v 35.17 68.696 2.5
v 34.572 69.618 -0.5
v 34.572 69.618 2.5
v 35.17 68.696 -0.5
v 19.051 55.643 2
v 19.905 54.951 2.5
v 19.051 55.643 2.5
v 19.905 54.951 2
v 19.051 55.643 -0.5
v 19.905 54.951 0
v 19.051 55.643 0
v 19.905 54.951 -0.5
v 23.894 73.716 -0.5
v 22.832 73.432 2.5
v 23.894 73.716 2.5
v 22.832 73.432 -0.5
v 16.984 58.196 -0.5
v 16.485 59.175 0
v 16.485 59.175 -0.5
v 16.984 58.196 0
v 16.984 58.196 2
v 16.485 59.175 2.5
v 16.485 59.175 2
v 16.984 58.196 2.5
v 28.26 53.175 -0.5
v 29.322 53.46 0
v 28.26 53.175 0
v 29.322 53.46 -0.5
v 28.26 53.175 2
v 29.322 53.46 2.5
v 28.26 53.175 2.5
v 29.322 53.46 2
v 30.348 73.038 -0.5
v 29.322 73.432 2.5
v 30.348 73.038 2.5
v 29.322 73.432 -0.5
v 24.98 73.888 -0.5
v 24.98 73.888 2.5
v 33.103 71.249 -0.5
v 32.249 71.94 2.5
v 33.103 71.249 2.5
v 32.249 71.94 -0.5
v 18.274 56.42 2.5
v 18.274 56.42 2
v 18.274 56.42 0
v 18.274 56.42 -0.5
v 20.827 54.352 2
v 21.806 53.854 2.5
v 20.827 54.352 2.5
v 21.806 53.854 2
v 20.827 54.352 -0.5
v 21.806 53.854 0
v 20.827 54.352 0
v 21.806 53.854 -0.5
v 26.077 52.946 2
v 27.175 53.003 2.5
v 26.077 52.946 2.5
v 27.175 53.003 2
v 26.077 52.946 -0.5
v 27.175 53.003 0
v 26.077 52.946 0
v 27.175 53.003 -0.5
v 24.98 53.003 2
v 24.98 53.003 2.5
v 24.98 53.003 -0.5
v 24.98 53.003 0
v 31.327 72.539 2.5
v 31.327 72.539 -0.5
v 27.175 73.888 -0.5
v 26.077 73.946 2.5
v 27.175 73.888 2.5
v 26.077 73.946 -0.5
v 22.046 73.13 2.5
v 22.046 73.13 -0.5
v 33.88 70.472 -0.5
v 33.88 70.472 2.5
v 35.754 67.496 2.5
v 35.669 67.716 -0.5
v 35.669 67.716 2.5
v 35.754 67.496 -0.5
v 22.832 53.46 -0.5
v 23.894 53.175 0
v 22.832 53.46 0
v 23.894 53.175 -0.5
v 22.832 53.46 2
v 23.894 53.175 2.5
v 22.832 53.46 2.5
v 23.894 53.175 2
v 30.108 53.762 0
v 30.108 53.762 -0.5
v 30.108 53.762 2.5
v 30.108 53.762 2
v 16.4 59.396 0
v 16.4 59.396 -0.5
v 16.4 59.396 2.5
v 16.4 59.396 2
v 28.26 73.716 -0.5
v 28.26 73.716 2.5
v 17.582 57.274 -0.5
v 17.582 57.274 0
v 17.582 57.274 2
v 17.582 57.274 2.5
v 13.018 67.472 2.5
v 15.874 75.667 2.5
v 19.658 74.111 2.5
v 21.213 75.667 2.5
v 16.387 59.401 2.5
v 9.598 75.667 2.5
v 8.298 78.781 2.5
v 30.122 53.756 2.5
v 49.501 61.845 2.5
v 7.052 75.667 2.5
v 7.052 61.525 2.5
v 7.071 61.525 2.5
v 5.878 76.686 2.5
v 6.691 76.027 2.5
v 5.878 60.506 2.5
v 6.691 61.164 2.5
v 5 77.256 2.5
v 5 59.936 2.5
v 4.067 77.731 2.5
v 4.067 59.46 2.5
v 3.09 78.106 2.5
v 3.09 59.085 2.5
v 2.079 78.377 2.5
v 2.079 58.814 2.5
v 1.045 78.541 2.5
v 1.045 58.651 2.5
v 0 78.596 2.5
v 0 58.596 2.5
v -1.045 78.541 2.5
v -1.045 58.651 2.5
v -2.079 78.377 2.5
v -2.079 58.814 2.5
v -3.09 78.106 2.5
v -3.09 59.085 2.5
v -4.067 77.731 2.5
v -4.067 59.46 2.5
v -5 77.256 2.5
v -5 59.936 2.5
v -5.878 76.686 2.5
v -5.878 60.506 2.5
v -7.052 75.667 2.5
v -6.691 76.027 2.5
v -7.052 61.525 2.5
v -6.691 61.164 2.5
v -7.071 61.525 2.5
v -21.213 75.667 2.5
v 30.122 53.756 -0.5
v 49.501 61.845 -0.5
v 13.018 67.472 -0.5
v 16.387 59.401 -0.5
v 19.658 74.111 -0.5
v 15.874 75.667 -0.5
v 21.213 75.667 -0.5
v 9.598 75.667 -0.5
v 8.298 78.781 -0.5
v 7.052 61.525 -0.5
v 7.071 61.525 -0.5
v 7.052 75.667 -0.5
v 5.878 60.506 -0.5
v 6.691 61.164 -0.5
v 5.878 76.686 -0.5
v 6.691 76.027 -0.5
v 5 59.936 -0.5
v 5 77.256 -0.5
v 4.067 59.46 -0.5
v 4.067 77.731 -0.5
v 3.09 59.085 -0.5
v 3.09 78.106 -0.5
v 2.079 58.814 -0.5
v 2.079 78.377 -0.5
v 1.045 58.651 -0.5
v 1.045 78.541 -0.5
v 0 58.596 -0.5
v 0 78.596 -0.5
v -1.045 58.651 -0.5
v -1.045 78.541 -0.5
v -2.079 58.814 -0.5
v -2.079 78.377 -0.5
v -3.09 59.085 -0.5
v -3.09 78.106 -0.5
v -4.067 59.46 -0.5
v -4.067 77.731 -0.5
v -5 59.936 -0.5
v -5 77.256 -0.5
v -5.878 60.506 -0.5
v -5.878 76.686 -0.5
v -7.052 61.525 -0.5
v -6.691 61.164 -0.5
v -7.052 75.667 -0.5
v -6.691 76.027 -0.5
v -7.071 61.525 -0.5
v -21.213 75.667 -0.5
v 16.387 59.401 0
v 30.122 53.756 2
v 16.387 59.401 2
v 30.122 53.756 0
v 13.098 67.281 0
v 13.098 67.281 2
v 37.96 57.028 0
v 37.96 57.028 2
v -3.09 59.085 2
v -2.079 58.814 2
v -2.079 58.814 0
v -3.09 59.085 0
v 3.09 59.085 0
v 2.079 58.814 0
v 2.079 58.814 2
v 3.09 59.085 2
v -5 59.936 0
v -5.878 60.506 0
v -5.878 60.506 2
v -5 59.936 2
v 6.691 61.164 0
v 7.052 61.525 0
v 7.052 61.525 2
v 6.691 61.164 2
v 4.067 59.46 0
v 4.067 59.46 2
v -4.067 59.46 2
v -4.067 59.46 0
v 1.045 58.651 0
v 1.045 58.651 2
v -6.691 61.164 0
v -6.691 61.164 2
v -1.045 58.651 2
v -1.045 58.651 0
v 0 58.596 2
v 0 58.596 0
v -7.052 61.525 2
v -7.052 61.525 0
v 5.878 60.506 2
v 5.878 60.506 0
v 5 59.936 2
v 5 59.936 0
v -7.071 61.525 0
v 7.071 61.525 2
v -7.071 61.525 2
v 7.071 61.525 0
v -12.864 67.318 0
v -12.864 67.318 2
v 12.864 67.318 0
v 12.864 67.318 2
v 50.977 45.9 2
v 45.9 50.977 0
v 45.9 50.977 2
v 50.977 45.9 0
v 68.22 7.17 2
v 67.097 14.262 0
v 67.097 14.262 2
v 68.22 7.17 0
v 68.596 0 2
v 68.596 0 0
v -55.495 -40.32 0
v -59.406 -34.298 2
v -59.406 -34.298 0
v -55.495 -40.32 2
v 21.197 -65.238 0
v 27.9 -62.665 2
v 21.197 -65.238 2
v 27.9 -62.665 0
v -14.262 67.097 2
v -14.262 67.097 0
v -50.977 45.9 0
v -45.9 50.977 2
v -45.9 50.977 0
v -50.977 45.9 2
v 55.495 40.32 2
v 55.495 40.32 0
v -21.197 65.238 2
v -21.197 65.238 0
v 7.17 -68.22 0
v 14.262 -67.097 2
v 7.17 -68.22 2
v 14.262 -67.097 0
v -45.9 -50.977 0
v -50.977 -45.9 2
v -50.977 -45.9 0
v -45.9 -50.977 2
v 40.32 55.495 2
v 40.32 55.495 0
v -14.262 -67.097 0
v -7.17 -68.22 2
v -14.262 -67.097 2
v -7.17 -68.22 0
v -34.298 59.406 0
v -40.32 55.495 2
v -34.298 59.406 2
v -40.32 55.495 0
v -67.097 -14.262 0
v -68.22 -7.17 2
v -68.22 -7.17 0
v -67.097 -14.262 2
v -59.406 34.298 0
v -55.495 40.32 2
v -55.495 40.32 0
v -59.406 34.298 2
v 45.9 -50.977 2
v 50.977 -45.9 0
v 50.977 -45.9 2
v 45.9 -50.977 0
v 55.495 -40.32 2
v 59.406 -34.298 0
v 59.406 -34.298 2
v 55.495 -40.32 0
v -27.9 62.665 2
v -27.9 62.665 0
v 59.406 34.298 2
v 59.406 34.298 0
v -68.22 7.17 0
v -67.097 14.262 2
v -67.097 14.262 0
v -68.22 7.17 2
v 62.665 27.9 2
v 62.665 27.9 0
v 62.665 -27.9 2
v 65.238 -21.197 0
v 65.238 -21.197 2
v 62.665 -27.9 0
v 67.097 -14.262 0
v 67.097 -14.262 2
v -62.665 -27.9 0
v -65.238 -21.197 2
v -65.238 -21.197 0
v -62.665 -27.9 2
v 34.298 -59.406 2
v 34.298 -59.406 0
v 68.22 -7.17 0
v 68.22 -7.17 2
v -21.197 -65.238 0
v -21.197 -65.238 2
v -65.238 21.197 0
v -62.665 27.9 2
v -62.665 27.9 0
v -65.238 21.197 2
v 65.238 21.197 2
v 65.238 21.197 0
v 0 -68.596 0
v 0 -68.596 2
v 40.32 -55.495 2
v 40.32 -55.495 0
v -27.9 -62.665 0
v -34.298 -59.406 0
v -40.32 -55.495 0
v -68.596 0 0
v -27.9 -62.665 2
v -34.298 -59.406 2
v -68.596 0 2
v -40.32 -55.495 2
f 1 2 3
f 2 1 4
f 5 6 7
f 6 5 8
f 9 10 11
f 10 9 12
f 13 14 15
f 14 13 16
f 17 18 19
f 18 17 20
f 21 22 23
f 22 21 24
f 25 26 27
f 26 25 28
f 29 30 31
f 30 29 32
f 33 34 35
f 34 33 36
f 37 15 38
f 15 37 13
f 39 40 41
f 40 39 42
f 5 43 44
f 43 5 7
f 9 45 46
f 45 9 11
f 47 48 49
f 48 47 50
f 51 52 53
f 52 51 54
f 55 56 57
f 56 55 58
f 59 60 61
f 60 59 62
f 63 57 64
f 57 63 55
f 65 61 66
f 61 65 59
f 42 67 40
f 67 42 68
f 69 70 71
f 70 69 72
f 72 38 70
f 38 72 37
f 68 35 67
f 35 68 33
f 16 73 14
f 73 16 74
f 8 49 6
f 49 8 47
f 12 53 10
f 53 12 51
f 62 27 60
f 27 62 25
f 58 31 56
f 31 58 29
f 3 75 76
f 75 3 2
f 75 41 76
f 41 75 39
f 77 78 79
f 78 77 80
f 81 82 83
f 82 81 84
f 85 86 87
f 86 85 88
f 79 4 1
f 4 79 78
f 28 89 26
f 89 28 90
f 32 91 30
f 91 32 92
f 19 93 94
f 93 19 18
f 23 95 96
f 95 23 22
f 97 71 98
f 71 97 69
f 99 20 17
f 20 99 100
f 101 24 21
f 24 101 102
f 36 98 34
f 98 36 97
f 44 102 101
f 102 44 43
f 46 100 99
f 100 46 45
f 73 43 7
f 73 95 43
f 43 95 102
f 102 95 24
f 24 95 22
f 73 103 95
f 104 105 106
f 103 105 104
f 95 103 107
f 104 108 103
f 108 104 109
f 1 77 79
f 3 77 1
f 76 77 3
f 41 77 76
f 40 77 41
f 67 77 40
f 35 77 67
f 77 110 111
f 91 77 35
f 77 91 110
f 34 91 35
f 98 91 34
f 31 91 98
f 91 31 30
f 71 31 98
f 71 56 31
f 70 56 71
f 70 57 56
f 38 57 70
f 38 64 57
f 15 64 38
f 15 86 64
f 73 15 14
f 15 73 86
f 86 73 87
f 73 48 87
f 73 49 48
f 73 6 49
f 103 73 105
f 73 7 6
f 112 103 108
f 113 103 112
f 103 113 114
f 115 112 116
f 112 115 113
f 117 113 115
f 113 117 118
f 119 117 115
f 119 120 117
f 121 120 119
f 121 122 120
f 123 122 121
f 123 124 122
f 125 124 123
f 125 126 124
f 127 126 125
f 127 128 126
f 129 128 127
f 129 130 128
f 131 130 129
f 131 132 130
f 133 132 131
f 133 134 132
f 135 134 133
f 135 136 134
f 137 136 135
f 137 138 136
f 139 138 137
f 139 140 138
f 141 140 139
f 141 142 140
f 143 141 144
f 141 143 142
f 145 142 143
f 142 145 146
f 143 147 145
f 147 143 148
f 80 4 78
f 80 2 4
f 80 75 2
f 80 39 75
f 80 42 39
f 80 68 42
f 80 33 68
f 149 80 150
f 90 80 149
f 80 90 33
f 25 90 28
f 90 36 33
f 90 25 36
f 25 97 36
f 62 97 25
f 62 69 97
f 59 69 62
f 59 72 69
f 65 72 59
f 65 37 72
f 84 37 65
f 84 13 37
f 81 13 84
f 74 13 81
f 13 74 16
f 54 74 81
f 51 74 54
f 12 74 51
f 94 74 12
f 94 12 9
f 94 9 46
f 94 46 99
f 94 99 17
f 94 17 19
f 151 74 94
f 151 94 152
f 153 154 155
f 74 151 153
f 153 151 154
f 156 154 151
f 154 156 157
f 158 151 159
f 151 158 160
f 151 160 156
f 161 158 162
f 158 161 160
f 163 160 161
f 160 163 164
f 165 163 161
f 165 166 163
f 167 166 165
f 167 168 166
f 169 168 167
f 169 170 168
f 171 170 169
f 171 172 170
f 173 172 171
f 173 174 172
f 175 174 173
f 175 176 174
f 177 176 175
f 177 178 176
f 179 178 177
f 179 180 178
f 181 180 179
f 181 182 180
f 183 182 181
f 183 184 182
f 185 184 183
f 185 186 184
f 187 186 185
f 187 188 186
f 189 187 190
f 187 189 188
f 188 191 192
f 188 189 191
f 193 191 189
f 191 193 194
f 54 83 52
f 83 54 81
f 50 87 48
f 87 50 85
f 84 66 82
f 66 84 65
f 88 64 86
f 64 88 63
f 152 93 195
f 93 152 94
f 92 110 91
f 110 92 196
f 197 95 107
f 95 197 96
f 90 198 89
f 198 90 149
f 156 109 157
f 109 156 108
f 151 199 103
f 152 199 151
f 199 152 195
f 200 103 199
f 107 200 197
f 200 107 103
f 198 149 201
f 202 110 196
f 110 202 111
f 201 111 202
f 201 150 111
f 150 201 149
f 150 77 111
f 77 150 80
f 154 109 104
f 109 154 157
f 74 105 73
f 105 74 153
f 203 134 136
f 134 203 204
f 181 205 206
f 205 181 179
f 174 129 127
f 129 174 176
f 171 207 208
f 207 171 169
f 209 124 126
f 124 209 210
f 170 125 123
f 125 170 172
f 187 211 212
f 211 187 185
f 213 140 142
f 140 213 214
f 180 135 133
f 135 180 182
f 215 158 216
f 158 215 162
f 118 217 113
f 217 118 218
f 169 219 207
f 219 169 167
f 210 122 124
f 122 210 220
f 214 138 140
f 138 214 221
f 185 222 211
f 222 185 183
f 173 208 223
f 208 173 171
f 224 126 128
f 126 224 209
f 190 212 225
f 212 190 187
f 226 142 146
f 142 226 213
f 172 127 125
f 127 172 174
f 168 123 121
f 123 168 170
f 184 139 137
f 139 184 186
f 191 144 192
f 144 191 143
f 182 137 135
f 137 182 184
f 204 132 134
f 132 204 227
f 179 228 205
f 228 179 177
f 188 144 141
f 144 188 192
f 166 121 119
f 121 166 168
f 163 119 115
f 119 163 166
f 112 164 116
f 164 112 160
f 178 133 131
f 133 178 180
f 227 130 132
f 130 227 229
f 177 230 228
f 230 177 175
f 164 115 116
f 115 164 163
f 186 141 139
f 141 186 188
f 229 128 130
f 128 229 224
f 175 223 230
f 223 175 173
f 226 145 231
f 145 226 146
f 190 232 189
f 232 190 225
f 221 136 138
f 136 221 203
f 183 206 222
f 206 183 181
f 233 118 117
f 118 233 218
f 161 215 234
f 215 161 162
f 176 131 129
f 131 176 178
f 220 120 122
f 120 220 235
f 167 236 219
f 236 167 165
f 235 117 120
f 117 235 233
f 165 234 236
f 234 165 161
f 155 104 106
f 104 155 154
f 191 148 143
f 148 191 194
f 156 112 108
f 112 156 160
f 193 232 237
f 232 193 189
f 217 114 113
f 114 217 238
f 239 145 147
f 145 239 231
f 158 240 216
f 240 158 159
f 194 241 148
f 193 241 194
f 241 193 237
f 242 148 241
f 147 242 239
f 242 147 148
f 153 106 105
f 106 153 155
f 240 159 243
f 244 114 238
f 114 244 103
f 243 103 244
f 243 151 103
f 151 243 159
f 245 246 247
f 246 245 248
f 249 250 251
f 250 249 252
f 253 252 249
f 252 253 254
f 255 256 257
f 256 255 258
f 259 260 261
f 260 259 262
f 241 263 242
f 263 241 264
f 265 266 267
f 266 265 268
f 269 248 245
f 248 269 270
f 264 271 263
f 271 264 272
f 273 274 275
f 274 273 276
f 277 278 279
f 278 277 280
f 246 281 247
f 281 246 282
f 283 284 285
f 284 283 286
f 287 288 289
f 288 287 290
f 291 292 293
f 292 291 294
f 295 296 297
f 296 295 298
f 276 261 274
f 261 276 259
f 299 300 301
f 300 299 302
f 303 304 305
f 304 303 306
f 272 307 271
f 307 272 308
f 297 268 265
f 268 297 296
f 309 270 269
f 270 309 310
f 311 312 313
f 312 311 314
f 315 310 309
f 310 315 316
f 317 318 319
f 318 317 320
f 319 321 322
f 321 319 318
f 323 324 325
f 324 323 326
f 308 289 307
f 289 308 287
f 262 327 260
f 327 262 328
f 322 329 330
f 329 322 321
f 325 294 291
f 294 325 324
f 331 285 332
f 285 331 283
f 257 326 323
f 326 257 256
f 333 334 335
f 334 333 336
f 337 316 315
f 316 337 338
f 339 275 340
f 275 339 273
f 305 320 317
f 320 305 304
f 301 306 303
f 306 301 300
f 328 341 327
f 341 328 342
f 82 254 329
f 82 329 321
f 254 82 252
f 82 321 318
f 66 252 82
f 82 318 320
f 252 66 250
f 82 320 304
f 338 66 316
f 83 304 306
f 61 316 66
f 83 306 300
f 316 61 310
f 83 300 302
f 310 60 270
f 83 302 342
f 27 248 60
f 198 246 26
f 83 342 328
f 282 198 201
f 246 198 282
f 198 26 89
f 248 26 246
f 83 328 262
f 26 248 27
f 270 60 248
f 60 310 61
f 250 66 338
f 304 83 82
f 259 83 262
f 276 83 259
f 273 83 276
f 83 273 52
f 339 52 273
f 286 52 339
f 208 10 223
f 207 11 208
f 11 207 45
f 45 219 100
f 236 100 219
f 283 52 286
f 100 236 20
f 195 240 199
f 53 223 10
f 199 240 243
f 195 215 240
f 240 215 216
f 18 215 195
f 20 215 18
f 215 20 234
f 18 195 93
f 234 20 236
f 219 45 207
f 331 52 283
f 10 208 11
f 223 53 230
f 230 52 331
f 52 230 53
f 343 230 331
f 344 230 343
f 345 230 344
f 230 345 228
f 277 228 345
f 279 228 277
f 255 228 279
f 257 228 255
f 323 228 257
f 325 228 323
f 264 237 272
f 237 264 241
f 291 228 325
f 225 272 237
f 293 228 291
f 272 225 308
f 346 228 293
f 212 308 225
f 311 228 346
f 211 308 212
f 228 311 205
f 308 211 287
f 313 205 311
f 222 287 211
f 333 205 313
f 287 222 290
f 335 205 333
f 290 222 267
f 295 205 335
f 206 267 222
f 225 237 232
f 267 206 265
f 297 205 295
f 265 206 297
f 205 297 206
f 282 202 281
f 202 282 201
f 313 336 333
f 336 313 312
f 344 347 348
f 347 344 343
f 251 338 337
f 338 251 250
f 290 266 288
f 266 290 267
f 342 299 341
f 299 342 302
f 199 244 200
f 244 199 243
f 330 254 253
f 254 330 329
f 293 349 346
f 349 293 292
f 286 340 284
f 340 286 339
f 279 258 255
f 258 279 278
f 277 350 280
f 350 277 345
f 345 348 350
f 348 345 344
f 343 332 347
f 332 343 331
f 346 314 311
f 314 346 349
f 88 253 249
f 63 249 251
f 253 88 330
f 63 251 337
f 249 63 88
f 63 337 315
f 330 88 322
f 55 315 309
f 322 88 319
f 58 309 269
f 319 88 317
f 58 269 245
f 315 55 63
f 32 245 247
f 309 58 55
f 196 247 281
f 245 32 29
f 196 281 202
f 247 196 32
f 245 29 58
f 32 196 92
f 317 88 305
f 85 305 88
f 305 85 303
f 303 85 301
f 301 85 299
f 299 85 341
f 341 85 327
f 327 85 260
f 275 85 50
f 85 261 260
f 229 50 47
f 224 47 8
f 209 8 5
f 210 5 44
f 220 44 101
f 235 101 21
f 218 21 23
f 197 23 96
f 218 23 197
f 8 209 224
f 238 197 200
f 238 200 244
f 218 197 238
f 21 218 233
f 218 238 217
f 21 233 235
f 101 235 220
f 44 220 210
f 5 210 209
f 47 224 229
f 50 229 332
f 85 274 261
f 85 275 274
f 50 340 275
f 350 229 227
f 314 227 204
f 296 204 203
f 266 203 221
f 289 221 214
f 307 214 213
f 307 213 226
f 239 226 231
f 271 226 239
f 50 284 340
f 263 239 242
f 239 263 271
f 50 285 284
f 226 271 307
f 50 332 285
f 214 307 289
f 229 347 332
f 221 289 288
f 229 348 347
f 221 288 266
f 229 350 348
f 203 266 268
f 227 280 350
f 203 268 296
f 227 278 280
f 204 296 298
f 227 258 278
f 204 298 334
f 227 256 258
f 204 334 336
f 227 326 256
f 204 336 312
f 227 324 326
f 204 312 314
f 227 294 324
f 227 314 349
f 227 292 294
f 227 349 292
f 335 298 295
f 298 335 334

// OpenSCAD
$fn=60;


minimum_radius=10.0;
maximum_radius=20.0;
step=0.5;
overcut=0.5;
thickness = 2;

function margin(r) = 3.0+r/2;

function needed_length(r) = r * 2.0 + margin(r);

function sum_needed_length(n) = 
    n <= minimum_radius
        ? needed_length(n)
        : sum_needed_length(n-1.0) + needed_length(n);

circumference = sum_needed_length(maximum_radius) - margin(minimum_radius) / 4 - (needed_length(maximum_radius)/2) + (needed_length(minimum_radius)/2);

radius = circumference/(2.0*PI);

module cutout(r) {
    // calculate distance along circumference for this radius center point
    d = sum_needed_length(r) - needed_length(r);
    degrees = d / circumference * 360;
    rotation = (45 - degrees)%360;
    
    x = sin(degrees) * radius;
    y = cos(degrees) * radius;
    
    translate(
        [x, y, -overcut]
    ) cylinder(
        h=thickness+overcut*2,
        r=r
    );
    
    translate(
        [x, y, -overcut]
    ) rotate(
        [0, 0, rotation]
    ) linear_extrude(
        height=thickness + overcut*2
    ) polygon([
        [-r, 0],
        [-r, r*2],
        [r*2, -r],
        [0, -r]
    ]);
    
}

module radius_text(r) {
    d = sum_needed_length(r) - needed_length(r);
    degrees = d / circumference * 360;
    
    text_center_distance = radius - r - minimum_radius;
    
    translate(
        [sin(degrees) * text_center_distance, cos(degrees) * text_center_distance, -overcut]
    ) rotate(
        [0, 0, 180-degrees]
    ) linear_extrude(
        thickness + overcut*2
    ) text(
        str(r),
        size = 4,
        font = "Liberation Sans",
        halign = "center"
    );
}

difference() {
    cylinder(thickness, radius, radius);
}
/*
    for (i = [minimum_radius : step : maximum_radius]) {
        cutout(i);
        radius_text(i);
    }
*/
cutout(10.5);
cutout(10);
